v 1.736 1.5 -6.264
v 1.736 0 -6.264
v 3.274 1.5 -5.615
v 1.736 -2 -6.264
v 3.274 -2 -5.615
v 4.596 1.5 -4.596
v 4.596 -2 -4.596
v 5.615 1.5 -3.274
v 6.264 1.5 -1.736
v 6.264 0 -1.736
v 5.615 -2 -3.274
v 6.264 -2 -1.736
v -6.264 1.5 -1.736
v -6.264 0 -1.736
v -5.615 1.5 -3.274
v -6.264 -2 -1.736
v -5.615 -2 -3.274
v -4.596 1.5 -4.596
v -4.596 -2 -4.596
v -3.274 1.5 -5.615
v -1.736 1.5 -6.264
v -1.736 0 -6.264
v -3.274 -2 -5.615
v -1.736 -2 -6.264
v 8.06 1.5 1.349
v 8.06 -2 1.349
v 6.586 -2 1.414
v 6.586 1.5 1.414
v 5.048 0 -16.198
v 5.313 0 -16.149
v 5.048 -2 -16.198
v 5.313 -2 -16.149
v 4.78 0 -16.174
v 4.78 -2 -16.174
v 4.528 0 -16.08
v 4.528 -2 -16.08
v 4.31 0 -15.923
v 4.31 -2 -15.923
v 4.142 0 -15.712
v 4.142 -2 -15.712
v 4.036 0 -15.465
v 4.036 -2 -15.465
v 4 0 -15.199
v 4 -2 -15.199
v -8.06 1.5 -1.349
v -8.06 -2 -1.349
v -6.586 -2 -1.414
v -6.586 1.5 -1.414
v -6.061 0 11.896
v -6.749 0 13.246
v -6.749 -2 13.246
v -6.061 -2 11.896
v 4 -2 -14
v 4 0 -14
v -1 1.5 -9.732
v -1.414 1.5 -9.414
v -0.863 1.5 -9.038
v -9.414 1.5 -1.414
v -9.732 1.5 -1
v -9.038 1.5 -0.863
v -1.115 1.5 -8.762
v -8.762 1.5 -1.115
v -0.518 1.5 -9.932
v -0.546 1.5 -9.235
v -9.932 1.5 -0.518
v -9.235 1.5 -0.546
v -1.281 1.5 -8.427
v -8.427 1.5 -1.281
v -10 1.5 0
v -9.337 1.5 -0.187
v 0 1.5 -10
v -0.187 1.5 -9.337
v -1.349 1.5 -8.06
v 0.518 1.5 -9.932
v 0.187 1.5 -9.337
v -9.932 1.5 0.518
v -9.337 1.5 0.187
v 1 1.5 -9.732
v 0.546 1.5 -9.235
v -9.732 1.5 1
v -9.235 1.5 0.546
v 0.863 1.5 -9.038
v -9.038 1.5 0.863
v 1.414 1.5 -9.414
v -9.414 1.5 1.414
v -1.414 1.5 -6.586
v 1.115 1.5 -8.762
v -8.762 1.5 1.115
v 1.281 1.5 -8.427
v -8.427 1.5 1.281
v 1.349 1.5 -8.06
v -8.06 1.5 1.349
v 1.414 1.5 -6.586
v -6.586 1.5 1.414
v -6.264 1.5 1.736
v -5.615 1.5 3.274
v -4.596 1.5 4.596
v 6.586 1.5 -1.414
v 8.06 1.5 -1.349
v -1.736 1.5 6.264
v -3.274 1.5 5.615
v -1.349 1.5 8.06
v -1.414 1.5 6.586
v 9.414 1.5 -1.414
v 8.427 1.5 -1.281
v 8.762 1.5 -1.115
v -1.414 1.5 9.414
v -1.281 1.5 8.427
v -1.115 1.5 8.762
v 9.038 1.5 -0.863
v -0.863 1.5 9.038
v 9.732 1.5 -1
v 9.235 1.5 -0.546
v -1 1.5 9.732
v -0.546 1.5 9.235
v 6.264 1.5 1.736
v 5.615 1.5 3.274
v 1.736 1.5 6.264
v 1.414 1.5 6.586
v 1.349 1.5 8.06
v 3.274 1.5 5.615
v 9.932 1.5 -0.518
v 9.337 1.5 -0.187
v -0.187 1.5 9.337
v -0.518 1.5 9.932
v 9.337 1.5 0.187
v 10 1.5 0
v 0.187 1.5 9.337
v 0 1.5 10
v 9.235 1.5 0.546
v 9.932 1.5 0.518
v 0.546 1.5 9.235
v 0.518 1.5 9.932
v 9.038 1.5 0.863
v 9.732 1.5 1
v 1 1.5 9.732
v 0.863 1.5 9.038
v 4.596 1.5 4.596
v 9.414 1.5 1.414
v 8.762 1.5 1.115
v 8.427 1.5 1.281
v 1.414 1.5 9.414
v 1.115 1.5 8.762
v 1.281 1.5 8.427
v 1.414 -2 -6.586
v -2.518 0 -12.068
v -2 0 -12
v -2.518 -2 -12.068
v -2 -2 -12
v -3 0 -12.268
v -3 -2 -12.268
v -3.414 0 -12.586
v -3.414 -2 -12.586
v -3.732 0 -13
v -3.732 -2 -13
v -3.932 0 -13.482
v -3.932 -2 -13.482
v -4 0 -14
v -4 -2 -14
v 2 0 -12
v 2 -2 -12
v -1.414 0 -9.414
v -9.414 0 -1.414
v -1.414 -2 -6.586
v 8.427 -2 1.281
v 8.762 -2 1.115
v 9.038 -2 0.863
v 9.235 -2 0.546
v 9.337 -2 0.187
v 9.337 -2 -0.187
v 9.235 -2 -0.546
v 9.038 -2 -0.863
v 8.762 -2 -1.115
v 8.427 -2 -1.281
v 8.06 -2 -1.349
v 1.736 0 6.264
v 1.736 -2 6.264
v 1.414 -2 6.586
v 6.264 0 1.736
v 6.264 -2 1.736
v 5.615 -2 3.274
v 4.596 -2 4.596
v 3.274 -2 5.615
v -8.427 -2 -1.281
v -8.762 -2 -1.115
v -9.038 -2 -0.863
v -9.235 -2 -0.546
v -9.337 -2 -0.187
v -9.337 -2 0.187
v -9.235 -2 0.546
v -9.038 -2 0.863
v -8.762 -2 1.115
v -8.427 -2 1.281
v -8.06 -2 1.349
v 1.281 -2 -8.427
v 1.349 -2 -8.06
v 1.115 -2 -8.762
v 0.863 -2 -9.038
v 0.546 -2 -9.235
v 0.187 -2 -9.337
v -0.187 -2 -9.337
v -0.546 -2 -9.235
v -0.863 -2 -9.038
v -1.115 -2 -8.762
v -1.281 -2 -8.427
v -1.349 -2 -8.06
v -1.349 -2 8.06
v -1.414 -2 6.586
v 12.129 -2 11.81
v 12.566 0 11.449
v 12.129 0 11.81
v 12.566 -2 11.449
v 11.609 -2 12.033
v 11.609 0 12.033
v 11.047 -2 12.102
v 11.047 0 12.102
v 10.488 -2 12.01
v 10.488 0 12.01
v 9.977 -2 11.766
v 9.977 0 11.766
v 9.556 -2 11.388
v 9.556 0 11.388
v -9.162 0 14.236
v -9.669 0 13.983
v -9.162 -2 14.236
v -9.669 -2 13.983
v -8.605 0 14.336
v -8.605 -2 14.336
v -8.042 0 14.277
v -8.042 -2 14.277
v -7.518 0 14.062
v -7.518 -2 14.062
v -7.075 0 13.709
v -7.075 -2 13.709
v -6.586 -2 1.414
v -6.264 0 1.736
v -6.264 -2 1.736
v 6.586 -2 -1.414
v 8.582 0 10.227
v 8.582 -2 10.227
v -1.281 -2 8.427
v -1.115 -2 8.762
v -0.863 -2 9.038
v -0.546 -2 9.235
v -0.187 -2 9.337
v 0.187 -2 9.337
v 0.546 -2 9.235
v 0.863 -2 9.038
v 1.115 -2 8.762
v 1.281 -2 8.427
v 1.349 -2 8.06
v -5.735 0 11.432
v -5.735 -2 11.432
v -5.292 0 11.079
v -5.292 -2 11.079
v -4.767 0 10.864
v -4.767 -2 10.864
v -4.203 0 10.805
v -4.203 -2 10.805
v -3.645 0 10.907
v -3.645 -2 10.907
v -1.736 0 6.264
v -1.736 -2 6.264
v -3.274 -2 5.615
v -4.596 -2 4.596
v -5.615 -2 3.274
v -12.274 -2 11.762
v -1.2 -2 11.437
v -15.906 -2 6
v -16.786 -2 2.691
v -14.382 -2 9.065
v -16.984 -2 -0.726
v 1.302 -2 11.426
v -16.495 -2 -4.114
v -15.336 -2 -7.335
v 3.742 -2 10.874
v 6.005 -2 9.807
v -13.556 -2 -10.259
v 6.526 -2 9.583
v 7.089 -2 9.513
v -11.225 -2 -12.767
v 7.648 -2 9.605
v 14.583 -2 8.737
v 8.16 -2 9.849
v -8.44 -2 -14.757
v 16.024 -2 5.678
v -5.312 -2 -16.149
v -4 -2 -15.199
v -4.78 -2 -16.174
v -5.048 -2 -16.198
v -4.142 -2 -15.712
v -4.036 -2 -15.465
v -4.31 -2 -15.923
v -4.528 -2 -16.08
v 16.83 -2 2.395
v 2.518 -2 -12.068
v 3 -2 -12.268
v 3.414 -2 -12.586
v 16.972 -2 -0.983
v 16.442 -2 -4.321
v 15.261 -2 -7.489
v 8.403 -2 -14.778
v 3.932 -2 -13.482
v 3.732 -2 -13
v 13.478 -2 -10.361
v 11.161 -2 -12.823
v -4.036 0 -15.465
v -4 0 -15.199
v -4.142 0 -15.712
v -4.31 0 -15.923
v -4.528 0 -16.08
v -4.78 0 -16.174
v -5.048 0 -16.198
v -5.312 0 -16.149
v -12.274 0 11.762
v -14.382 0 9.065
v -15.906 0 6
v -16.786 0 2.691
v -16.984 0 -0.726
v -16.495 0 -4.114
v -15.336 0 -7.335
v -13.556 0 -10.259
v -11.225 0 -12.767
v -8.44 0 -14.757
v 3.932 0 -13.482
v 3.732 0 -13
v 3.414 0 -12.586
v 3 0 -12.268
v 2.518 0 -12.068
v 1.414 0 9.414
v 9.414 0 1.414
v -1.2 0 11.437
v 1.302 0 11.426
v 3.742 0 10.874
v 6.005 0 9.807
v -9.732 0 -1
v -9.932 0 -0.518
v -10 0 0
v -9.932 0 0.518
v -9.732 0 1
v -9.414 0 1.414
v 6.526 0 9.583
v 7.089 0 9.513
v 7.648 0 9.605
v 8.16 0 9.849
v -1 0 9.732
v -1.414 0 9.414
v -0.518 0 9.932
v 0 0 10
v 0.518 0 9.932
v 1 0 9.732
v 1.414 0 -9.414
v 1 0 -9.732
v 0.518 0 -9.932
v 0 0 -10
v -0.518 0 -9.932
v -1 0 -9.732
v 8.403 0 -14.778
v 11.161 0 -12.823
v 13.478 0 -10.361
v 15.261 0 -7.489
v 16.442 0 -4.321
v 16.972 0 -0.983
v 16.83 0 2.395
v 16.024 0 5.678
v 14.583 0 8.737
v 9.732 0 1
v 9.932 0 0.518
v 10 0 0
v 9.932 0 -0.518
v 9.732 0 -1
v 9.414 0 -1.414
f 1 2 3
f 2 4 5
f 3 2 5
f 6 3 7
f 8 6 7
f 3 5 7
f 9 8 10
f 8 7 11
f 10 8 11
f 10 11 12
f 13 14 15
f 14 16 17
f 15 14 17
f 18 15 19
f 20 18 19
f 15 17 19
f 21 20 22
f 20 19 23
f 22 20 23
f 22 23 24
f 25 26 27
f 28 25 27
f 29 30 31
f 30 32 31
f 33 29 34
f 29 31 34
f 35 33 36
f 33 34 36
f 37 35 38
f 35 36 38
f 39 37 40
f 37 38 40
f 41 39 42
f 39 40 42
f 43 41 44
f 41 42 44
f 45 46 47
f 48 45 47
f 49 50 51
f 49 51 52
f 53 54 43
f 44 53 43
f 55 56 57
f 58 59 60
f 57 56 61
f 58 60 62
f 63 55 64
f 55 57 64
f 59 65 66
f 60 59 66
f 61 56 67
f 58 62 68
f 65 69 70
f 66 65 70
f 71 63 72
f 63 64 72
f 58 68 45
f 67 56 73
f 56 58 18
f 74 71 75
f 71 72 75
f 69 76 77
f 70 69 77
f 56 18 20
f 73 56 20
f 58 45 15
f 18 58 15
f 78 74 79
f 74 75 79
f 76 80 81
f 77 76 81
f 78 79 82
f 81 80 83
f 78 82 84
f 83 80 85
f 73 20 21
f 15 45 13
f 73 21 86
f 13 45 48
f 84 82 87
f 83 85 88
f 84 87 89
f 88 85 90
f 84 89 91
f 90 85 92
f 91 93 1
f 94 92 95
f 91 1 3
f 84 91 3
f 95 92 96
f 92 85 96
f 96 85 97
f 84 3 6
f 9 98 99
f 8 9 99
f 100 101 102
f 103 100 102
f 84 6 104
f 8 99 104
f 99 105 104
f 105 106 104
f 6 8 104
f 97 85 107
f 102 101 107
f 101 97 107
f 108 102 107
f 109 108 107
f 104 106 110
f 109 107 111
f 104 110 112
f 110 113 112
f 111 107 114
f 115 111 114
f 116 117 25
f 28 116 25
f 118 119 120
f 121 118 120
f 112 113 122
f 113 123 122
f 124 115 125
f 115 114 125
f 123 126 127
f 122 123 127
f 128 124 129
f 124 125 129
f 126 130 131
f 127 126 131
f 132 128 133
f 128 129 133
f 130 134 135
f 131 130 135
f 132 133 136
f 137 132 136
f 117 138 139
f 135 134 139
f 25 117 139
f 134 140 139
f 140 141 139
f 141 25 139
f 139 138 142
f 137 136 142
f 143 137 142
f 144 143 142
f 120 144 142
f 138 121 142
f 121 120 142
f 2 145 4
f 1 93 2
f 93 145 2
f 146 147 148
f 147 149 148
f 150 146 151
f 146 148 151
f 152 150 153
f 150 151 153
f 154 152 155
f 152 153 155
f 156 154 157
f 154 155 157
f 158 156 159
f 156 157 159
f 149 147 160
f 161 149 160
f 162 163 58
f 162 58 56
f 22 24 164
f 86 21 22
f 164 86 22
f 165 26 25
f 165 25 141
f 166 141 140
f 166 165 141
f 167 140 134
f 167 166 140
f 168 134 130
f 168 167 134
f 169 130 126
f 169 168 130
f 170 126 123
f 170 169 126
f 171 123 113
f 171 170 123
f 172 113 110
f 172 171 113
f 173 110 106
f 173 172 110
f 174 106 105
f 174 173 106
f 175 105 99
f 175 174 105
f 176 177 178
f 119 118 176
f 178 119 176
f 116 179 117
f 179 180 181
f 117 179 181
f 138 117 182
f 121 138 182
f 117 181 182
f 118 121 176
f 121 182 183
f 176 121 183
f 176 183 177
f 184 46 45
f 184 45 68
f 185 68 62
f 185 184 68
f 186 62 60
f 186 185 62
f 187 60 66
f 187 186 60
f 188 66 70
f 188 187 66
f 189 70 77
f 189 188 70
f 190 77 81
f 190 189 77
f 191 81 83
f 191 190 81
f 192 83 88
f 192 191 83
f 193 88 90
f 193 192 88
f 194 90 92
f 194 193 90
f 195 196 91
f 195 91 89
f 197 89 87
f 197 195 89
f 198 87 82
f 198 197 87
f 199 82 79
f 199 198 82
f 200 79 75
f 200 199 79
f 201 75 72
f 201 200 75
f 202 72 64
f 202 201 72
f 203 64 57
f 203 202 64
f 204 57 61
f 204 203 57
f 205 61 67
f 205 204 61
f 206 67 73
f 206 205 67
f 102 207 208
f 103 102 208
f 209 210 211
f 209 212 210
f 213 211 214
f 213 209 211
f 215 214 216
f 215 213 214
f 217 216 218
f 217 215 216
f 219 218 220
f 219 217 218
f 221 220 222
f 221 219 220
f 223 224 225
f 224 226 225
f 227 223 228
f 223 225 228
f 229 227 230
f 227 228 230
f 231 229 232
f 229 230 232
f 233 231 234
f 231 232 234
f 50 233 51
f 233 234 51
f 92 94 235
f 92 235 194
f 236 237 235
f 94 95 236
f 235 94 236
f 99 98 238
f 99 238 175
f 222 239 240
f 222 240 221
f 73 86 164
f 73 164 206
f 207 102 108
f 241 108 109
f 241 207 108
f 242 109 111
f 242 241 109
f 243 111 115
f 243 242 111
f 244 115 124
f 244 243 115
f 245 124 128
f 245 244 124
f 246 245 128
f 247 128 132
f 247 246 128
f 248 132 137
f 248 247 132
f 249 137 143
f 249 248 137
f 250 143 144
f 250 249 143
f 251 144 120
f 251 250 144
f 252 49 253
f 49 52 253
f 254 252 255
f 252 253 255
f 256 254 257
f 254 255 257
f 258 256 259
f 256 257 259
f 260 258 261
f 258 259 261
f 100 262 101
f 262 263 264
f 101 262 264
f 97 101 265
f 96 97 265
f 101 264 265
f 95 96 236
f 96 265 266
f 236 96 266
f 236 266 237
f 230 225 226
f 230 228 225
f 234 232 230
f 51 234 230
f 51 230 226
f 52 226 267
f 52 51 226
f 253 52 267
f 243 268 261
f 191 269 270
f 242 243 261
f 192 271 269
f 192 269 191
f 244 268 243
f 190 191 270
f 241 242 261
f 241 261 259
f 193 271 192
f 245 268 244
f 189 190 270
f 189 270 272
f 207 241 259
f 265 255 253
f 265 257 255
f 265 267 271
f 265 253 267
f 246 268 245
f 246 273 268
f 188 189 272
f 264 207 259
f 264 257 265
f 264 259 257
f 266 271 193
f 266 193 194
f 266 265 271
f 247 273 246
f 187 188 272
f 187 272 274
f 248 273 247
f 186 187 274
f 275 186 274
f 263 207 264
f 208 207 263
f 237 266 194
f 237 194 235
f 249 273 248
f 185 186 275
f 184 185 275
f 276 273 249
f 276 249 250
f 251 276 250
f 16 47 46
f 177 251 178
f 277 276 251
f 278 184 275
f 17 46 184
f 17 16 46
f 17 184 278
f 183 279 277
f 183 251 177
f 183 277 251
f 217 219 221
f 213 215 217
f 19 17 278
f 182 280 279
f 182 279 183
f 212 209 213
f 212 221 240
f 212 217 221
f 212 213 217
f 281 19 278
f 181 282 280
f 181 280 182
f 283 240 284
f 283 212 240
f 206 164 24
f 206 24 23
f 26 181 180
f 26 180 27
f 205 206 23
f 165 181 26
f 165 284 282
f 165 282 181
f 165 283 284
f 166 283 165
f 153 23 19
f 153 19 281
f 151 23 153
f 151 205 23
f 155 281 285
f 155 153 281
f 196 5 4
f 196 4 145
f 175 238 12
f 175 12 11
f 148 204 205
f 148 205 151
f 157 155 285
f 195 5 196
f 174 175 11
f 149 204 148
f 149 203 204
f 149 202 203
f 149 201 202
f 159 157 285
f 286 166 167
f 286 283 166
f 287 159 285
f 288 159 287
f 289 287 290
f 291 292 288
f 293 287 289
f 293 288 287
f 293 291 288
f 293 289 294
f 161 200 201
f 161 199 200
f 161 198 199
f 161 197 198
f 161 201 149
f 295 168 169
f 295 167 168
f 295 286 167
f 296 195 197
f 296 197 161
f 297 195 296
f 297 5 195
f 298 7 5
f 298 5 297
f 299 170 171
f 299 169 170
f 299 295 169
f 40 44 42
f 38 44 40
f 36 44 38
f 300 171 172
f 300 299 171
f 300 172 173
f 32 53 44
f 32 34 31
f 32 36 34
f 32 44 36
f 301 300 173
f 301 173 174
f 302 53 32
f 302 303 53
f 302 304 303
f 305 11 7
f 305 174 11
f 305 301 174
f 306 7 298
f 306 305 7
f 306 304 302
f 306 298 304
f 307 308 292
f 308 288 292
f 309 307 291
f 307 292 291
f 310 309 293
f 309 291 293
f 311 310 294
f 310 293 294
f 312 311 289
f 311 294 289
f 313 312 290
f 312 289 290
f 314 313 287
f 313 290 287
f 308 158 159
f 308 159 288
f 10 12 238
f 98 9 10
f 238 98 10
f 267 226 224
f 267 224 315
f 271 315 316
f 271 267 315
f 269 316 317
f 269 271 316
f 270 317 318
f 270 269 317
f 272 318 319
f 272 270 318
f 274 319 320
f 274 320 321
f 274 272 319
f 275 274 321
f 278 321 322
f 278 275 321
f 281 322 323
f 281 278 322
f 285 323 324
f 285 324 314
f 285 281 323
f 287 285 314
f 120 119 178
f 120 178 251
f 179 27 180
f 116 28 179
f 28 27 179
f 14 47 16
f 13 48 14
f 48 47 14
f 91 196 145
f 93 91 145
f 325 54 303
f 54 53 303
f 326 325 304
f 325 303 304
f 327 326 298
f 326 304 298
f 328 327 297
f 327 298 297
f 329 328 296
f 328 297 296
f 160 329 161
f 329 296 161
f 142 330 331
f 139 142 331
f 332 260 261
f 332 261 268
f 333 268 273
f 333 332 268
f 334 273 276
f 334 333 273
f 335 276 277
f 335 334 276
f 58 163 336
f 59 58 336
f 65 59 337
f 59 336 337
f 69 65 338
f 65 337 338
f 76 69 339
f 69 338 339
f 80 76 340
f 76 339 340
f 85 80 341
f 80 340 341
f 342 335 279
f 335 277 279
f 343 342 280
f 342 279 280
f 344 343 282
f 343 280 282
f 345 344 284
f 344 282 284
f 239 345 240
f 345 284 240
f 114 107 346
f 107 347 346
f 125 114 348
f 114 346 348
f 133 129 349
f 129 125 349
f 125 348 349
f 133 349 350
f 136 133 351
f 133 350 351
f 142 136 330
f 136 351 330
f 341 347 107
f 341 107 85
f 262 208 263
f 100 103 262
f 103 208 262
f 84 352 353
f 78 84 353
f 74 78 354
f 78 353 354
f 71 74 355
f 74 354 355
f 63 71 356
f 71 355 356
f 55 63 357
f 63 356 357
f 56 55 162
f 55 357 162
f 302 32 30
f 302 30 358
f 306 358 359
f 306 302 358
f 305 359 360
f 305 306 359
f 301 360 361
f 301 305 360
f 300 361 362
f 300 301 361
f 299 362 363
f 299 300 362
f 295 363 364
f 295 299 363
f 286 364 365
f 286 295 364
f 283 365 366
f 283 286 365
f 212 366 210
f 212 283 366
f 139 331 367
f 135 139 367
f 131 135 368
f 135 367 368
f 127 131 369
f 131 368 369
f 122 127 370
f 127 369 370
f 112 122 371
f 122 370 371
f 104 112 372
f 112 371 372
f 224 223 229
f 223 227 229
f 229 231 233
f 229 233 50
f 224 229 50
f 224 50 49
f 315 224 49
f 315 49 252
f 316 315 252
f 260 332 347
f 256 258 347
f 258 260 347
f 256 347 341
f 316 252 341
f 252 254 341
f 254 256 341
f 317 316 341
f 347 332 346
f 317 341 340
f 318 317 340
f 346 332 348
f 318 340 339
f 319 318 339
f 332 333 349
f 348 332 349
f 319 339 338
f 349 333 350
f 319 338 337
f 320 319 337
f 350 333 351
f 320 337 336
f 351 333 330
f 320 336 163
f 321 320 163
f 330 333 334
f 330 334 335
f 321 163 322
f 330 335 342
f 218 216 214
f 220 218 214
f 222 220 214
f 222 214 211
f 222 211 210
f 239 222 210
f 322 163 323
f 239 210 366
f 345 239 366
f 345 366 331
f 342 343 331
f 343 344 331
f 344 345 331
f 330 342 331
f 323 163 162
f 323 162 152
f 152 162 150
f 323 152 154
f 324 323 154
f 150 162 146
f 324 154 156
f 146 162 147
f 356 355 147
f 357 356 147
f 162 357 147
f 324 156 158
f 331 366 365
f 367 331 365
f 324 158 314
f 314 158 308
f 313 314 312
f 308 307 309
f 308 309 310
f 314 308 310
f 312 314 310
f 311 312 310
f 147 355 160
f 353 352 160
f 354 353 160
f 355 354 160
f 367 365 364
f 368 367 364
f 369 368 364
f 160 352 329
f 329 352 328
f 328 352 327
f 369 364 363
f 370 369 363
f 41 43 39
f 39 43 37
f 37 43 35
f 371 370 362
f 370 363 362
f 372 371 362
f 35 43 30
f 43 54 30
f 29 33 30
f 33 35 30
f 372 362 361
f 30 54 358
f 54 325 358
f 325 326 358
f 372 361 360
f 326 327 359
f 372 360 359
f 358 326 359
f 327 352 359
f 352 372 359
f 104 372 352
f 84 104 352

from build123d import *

# Parameters (mm, degrees)
SKETCH_1_R               = 2
SKETCH_1_R_2             = 1.35
EXTRUDE_1_DEPTH          = 1.5
EXTRUDE_1_2_DEPTH        = 1.5
EXTRUDE_1_3_DEPTH        = 1.5
EXTRUDE_1_4_DEPTH        = 1.5
EXTRUDE_3_DEPTH          = 1.5
SKETCH_5_R               = 6.5
CUT_EXTRUDE_1_DEPTH      = 15.221462653
EXTRUDE_START            = 2
SKETCH_4_R               = 17
SKETCH_4_R_2             = 6.5
EXTRUDE_4_DEPTH          = 2
CUT_EXTRUDE_4_DEPTH      = 25.124676164
CUT_EXTRUDE_4_DEPTH_BACK = 25.124676164
SKETCH_8_R               = 1.35
SKETCH_6_W               = 8
SKETCH_6_H               = 5
CUT_EXTRUDE_2_DEPTH      = 25.124676164
CUT_EXTRUDE_3_DEPTH      = 25.124676164
CUT_EXTRUDE_5_DEPTH      = 24.963513933
FILLET_1_R               = 2
FILLET_2_R               = 1


with BuildPart() as part:
    # 草图1 → 凸台-拉伸1 (new body)
    with BuildSketch(Plane(origin=(0, 0, 0), x_dir=(1, 0, 0), z_dir=(0, 1, 0))):
        with Locations(Location((0, 8, 0), (0, 0, 270))):
            Circle(SKETCH_1_R)
        with Locations(Location((0, 8, 0), (0, 0, 270))):
            Circle(SKETCH_1_R_2, mode=Mode.SUBTRACT)
    extrude(amount=EXTRUDE_1_DEPTH)



with BuildPart() as body_2:
    # 草图1 → Extrude 1 2 (new body)
    with BuildSketch(Plane(origin=(0, 0, 0), x_dir=(1, 0, 0), z_dir=(0, 1, 0))):
        with Locations(Location((8, 0, 0), (0, 0, 270))):
            Circle(SKETCH_1_R)
        with Locations(Location((8, 0, 0), (0, 0, 270))):
            Circle(SKETCH_1_R_2, mode=Mode.SUBTRACT)
    extrude(amount=EXTRUDE_1_2_DEPTH)


with BuildPart() as body_3:
    # 草图1 → Extrude 1 3 (new body)
    with BuildSketch(Plane(origin=(0, 0, 0), x_dir=(1, 0, 0), z_dir=(0, 1, 0))):
        with Locations(Location((0, -8, 0), (0, 0, 270))):
            Circle(SKETCH_1_R)
        with Locations(Location((0, -8, 0), (0, 0, 270))):
            Circle(SKETCH_1_R_2, mode=Mode.SUBTRACT)
    extrude(amount=EXTRUDE_1_3_DEPTH)


with BuildPart() as body_4:
    # 草图1 → Extrude 1 4 (new body)
    with BuildSketch(Plane(origin=(0, 0, 0), x_dir=(1, 0, 0), z_dir=(0, 1, 0))):
        with Locations(Location((-8, 0, 0), (0, 0, 270))):
            Circle(SKETCH_1_R)
        with Locations(Location((-8, 0, 0), (0, 0, 270))):
            Circle(SKETCH_1_R_2, mode=Mode.SUBTRACT)
    extrude(amount=EXTRUDE_1_4_DEPTH)


with BuildPart() as part_1:
    add(part.part)

    add(body_2.part)  # 凸台-拉伸3 merges body 2

    add(body_3.part)  # 凸台-拉伸3 merges body 3

    add(body_4.part)  # 凸台-拉伸3 merges body 4
    # 草图3 → 凸台-拉伸3 (add)
    with BuildSketch(Plane.XZ):
        with BuildLine():
            ThreePointArc((-1.414213562, -9.414213562), (-2, -8), (-1.414213562, -6.585786438))
            Line((-1.414213562, -6.585786438), (-6.585786438, -1.414213562))
            ThreePointArc((-6.585786438, -1.414213562), (-8, -2), (-9.414213562, -1.414213562))
            Line((-9.414213562, -1.414213562), (-1.414213562, -9.414213562))
        make_face()
        with BuildLine():
            Line((-1.414213562, 9.414213562), (-9.414213562, 1.414213562))
            ThreePointArc((-9.414213562, 1.414213562), (-8, 2), (-6.585786438, 1.414213562))
            Line((-6.585786438, 1.414213562), (-1.414213562, 6.585786438))
            ThreePointArc((-1.414213562, 6.585786438), (-2, 8), (-1.414213562, 9.414213562))
        make_face()
        with BuildLine():
            ThreePointArc((9.414213562, 1.414213562), (8, 2), (6.585786438, 1.414213562))
            Line((6.585786438, 1.414213562), (1.414213562, 6.585786438))
            ThreePointArc((1.414213562, 6.585786438), (2, 8), (1.414213562, 9.414213562))
            Line((1.414213562, 9.414213562), (9.414213562, 1.414213562))
        make_face()
        with BuildLine():
            ThreePointArc((1.414213562, -9.414213562), (2, -8), (1.414213562, -6.585786438))
            Line((1.414213562, -6.585786438), (6.585786438, -1.414213562))
            ThreePointArc((6.585786438, -1.414213562), (8, -2), (9.414213562, -1.414213562))
            Line((9.414213562, -1.414213562), (1.414213562, -9.414213562))
        make_face()
    extrude(amount=-EXTRUDE_3_DEPTH)

    # 草图5 → 切除-拉伸1 (cut, through all)
    with BuildSketch(Plane.XZ):
        Circle(SKETCH_5_R)
    extrude(amount=-CUT_EXTRUDE_1_DEPTH, mode=Mode.SUBTRACT)

    # 草图4 → 凸台-拉伸4 (add)
    with BuildSketch(Plane.XZ.offset(EXTRUDE_START)):
        with Locations(Location((0, 0, 0), (0, 0, 270))):
            Circle(SKETCH_4_R)
        with Locations(Location((0, 0, 0), (0, 0, 270))):
            Circle(SKETCH_4_R_2, mode=Mode.SUBTRACT)
    extrude(amount=-EXTRUDE_4_DEPTH)

    # 草图8 → 切除-拉伸4 (cut, two sides: drawn at the far end of the back side and taken through both)
    with BuildSketch(Plane(origin=(0, 0, 0), x_dir=(1, 0, 0), z_dir=(0, 1, 0)).offset(-CUT_EXTRUDE_4_DEPTH_BACK)):
        with Locations(Location((8, 0, 0), (0, 0, 270))):
            Circle(SKETCH_8_R)
        with Locations(Location((0, -8, 0), (0, 0, 270))):
            Circle(SKETCH_8_R)
        with Locations(Location((-8, 0, 0), (0, 0, 270))):
            Circle(SKETCH_8_R)
        with Locations(Location((0, 8, 0), (0, 0, 270))):
            Circle(SKETCH_8_R)
    extrude(amount=CUT_EXTRUDE_4_DEPTH + CUT_EXTRUDE_4_DEPTH_BACK, mode=Mode.SUBTRACT)

    # 草图6 → 切除-拉伸2 (cut, through all)
    with BuildSketch(Plane(origin=(0, 0, 0), x_dir=(1, 0, 0), z_dir=(0, 1, 0))):
        with Locations((0, 14.5)):
            Rectangle(SKETCH_6_W, SKETCH_6_H)
    extrude(amount=-CUT_EXTRUDE_2_DEPTH, mode=Mode.SUBTRACT)

    # 草图7 → 切除-拉伸3 (cut, through all)
    with BuildSketch(Plane(origin=(0, 0, 0), x_dir=(1, 0, 0), z_dir=(0, 1, 0))):
        with BuildLine():
            Line((7.392057511, -8.809511096), (10.927389365, -13.022755533))
            ThreePointArc((10.927389365, -13.022755533), (1.924454634, -16.890721547), (-7.717838496, -15.147110911))
            Line((-7.717838496, -15.147110911), (-5.220890747, -10.246575028))
            ThreePointArc((-5.220890747, -10.246575028), (1.301836958, -11.42607634), (7.392057511, -8.809511096))
        make_face()
    extrude(amount=-CUT_EXTRUDE_3_DEPTH, mode=Mode.SUBTRACT)

    # 草图11 → 切除-拉伸5 (cut, through all)
    with BuildSketch(Plane(origin=(0, 1.5, 0), x_dir=(1, 0, 0), z_dir=(0, 1, 0))):
        with BuildLine():
            Line((-8.059965436, 1.348667545), (-6.585786438, 1.414213562))
            Line((-6.585786438, 1.414213562), (-6.263846285, 1.736153715))
            ThreePointArc((-6.263846285, 1.736153715), (-4.596194078, 4.596194078), (-1.736153715, 6.263846285))
            Line((-1.736153715, 6.263846285), (-1.414213562, 6.585786438))
            Line((-1.414213562, 6.585786438), (-1.348667545, 8.059965436))
            ThreePointArc((-1.348667545, 8.059965436), (0, 9.35), (1.348667545, 8.059965436))
            Line((1.348667545, 8.059965436), (1.414213562, 6.585786438))
            Line((1.414213562, 6.585786438), (1.736153715, 6.263846285))
            ThreePointArc((1.736153715, 6.263846285), (4.596194078, 4.596194078), (6.263846285, 1.736153715))
            Line((6.263846285, 1.736153715), (6.585786438, 1.414213562))
            Line((6.585786438, 1.414213562), (8.059965436, 1.348667545))
            ThreePointArc((8.059965436, 1.348667545), (9.35, 0), (8.059965436, -1.348667545))
            Line((8.059965436, -1.348667545), (6.585786438, -1.414213562))
            Line((6.585786438, -1.414213562), (6.263846285, -1.736153715))
            ThreePointArc((6.263846285, -1.736153715), (4.596194078, -4.596194078), (1.736153715, -6.263846285))
            Line((1.736153715, -6.263846285), (1.414213562, -6.585786438))
            Line((1.414213562, -6.585786438), (1.348667545, -8.059965436))
            ThreePointArc((1.348667545, -8.059965436), (0, -9.35), (-1.348667545, -8.059965436))
            Line((-1.348667545, -8.059965436), (-1.414213562, -6.585786438))
            Line((-1.414213562, -6.585786438), (-1.736153715, -6.263846285))
            ThreePointArc((-1.736153715, -6.263846285), (-4.596194078, -4.596194078), (-6.263846285, -1.736153715))
            Line((-6.263846285, -1.736153715), (-6.585786438, -1.414213562))
            Line((-6.585786438, -1.414213562), (-8.059965436, -1.348667545))
            ThreePointArc((-8.059965436, -1.348667545), (-9.35, 0), (-8.059965436, 1.348667545))
        make_face()
    extrude(amount=-CUT_EXTRUDE_5_DEPTH, mode=Mode.SUBTRACT)

    # 圆角1
    fillet_1_edges = [part_1.edges().sort_by_distance(p)[0] for p in [
        (-4, -1, -12),
        (4, -1, -12),
        (-5.220890747, -1, 10.246575028),
        (7.392057511, -1, 8.809511096),
        (10.927389365, -1, 13.022755533),
        (-7.717838496, -1, 15.147110911),
    ]]
    fillet(fillet_1_edges, radius=FILLET_1_R)

    # 圆角2
    fillet_2_edges = [part_1.edges().sort_by_distance(p)[0] for p in [
        (4, -1, -16.522711642),
        (-4, -1, -16.522711642),
    ]]
    fillet(fillet_2_edges, radius=FILLET_2_R)


solid = part_1.part
